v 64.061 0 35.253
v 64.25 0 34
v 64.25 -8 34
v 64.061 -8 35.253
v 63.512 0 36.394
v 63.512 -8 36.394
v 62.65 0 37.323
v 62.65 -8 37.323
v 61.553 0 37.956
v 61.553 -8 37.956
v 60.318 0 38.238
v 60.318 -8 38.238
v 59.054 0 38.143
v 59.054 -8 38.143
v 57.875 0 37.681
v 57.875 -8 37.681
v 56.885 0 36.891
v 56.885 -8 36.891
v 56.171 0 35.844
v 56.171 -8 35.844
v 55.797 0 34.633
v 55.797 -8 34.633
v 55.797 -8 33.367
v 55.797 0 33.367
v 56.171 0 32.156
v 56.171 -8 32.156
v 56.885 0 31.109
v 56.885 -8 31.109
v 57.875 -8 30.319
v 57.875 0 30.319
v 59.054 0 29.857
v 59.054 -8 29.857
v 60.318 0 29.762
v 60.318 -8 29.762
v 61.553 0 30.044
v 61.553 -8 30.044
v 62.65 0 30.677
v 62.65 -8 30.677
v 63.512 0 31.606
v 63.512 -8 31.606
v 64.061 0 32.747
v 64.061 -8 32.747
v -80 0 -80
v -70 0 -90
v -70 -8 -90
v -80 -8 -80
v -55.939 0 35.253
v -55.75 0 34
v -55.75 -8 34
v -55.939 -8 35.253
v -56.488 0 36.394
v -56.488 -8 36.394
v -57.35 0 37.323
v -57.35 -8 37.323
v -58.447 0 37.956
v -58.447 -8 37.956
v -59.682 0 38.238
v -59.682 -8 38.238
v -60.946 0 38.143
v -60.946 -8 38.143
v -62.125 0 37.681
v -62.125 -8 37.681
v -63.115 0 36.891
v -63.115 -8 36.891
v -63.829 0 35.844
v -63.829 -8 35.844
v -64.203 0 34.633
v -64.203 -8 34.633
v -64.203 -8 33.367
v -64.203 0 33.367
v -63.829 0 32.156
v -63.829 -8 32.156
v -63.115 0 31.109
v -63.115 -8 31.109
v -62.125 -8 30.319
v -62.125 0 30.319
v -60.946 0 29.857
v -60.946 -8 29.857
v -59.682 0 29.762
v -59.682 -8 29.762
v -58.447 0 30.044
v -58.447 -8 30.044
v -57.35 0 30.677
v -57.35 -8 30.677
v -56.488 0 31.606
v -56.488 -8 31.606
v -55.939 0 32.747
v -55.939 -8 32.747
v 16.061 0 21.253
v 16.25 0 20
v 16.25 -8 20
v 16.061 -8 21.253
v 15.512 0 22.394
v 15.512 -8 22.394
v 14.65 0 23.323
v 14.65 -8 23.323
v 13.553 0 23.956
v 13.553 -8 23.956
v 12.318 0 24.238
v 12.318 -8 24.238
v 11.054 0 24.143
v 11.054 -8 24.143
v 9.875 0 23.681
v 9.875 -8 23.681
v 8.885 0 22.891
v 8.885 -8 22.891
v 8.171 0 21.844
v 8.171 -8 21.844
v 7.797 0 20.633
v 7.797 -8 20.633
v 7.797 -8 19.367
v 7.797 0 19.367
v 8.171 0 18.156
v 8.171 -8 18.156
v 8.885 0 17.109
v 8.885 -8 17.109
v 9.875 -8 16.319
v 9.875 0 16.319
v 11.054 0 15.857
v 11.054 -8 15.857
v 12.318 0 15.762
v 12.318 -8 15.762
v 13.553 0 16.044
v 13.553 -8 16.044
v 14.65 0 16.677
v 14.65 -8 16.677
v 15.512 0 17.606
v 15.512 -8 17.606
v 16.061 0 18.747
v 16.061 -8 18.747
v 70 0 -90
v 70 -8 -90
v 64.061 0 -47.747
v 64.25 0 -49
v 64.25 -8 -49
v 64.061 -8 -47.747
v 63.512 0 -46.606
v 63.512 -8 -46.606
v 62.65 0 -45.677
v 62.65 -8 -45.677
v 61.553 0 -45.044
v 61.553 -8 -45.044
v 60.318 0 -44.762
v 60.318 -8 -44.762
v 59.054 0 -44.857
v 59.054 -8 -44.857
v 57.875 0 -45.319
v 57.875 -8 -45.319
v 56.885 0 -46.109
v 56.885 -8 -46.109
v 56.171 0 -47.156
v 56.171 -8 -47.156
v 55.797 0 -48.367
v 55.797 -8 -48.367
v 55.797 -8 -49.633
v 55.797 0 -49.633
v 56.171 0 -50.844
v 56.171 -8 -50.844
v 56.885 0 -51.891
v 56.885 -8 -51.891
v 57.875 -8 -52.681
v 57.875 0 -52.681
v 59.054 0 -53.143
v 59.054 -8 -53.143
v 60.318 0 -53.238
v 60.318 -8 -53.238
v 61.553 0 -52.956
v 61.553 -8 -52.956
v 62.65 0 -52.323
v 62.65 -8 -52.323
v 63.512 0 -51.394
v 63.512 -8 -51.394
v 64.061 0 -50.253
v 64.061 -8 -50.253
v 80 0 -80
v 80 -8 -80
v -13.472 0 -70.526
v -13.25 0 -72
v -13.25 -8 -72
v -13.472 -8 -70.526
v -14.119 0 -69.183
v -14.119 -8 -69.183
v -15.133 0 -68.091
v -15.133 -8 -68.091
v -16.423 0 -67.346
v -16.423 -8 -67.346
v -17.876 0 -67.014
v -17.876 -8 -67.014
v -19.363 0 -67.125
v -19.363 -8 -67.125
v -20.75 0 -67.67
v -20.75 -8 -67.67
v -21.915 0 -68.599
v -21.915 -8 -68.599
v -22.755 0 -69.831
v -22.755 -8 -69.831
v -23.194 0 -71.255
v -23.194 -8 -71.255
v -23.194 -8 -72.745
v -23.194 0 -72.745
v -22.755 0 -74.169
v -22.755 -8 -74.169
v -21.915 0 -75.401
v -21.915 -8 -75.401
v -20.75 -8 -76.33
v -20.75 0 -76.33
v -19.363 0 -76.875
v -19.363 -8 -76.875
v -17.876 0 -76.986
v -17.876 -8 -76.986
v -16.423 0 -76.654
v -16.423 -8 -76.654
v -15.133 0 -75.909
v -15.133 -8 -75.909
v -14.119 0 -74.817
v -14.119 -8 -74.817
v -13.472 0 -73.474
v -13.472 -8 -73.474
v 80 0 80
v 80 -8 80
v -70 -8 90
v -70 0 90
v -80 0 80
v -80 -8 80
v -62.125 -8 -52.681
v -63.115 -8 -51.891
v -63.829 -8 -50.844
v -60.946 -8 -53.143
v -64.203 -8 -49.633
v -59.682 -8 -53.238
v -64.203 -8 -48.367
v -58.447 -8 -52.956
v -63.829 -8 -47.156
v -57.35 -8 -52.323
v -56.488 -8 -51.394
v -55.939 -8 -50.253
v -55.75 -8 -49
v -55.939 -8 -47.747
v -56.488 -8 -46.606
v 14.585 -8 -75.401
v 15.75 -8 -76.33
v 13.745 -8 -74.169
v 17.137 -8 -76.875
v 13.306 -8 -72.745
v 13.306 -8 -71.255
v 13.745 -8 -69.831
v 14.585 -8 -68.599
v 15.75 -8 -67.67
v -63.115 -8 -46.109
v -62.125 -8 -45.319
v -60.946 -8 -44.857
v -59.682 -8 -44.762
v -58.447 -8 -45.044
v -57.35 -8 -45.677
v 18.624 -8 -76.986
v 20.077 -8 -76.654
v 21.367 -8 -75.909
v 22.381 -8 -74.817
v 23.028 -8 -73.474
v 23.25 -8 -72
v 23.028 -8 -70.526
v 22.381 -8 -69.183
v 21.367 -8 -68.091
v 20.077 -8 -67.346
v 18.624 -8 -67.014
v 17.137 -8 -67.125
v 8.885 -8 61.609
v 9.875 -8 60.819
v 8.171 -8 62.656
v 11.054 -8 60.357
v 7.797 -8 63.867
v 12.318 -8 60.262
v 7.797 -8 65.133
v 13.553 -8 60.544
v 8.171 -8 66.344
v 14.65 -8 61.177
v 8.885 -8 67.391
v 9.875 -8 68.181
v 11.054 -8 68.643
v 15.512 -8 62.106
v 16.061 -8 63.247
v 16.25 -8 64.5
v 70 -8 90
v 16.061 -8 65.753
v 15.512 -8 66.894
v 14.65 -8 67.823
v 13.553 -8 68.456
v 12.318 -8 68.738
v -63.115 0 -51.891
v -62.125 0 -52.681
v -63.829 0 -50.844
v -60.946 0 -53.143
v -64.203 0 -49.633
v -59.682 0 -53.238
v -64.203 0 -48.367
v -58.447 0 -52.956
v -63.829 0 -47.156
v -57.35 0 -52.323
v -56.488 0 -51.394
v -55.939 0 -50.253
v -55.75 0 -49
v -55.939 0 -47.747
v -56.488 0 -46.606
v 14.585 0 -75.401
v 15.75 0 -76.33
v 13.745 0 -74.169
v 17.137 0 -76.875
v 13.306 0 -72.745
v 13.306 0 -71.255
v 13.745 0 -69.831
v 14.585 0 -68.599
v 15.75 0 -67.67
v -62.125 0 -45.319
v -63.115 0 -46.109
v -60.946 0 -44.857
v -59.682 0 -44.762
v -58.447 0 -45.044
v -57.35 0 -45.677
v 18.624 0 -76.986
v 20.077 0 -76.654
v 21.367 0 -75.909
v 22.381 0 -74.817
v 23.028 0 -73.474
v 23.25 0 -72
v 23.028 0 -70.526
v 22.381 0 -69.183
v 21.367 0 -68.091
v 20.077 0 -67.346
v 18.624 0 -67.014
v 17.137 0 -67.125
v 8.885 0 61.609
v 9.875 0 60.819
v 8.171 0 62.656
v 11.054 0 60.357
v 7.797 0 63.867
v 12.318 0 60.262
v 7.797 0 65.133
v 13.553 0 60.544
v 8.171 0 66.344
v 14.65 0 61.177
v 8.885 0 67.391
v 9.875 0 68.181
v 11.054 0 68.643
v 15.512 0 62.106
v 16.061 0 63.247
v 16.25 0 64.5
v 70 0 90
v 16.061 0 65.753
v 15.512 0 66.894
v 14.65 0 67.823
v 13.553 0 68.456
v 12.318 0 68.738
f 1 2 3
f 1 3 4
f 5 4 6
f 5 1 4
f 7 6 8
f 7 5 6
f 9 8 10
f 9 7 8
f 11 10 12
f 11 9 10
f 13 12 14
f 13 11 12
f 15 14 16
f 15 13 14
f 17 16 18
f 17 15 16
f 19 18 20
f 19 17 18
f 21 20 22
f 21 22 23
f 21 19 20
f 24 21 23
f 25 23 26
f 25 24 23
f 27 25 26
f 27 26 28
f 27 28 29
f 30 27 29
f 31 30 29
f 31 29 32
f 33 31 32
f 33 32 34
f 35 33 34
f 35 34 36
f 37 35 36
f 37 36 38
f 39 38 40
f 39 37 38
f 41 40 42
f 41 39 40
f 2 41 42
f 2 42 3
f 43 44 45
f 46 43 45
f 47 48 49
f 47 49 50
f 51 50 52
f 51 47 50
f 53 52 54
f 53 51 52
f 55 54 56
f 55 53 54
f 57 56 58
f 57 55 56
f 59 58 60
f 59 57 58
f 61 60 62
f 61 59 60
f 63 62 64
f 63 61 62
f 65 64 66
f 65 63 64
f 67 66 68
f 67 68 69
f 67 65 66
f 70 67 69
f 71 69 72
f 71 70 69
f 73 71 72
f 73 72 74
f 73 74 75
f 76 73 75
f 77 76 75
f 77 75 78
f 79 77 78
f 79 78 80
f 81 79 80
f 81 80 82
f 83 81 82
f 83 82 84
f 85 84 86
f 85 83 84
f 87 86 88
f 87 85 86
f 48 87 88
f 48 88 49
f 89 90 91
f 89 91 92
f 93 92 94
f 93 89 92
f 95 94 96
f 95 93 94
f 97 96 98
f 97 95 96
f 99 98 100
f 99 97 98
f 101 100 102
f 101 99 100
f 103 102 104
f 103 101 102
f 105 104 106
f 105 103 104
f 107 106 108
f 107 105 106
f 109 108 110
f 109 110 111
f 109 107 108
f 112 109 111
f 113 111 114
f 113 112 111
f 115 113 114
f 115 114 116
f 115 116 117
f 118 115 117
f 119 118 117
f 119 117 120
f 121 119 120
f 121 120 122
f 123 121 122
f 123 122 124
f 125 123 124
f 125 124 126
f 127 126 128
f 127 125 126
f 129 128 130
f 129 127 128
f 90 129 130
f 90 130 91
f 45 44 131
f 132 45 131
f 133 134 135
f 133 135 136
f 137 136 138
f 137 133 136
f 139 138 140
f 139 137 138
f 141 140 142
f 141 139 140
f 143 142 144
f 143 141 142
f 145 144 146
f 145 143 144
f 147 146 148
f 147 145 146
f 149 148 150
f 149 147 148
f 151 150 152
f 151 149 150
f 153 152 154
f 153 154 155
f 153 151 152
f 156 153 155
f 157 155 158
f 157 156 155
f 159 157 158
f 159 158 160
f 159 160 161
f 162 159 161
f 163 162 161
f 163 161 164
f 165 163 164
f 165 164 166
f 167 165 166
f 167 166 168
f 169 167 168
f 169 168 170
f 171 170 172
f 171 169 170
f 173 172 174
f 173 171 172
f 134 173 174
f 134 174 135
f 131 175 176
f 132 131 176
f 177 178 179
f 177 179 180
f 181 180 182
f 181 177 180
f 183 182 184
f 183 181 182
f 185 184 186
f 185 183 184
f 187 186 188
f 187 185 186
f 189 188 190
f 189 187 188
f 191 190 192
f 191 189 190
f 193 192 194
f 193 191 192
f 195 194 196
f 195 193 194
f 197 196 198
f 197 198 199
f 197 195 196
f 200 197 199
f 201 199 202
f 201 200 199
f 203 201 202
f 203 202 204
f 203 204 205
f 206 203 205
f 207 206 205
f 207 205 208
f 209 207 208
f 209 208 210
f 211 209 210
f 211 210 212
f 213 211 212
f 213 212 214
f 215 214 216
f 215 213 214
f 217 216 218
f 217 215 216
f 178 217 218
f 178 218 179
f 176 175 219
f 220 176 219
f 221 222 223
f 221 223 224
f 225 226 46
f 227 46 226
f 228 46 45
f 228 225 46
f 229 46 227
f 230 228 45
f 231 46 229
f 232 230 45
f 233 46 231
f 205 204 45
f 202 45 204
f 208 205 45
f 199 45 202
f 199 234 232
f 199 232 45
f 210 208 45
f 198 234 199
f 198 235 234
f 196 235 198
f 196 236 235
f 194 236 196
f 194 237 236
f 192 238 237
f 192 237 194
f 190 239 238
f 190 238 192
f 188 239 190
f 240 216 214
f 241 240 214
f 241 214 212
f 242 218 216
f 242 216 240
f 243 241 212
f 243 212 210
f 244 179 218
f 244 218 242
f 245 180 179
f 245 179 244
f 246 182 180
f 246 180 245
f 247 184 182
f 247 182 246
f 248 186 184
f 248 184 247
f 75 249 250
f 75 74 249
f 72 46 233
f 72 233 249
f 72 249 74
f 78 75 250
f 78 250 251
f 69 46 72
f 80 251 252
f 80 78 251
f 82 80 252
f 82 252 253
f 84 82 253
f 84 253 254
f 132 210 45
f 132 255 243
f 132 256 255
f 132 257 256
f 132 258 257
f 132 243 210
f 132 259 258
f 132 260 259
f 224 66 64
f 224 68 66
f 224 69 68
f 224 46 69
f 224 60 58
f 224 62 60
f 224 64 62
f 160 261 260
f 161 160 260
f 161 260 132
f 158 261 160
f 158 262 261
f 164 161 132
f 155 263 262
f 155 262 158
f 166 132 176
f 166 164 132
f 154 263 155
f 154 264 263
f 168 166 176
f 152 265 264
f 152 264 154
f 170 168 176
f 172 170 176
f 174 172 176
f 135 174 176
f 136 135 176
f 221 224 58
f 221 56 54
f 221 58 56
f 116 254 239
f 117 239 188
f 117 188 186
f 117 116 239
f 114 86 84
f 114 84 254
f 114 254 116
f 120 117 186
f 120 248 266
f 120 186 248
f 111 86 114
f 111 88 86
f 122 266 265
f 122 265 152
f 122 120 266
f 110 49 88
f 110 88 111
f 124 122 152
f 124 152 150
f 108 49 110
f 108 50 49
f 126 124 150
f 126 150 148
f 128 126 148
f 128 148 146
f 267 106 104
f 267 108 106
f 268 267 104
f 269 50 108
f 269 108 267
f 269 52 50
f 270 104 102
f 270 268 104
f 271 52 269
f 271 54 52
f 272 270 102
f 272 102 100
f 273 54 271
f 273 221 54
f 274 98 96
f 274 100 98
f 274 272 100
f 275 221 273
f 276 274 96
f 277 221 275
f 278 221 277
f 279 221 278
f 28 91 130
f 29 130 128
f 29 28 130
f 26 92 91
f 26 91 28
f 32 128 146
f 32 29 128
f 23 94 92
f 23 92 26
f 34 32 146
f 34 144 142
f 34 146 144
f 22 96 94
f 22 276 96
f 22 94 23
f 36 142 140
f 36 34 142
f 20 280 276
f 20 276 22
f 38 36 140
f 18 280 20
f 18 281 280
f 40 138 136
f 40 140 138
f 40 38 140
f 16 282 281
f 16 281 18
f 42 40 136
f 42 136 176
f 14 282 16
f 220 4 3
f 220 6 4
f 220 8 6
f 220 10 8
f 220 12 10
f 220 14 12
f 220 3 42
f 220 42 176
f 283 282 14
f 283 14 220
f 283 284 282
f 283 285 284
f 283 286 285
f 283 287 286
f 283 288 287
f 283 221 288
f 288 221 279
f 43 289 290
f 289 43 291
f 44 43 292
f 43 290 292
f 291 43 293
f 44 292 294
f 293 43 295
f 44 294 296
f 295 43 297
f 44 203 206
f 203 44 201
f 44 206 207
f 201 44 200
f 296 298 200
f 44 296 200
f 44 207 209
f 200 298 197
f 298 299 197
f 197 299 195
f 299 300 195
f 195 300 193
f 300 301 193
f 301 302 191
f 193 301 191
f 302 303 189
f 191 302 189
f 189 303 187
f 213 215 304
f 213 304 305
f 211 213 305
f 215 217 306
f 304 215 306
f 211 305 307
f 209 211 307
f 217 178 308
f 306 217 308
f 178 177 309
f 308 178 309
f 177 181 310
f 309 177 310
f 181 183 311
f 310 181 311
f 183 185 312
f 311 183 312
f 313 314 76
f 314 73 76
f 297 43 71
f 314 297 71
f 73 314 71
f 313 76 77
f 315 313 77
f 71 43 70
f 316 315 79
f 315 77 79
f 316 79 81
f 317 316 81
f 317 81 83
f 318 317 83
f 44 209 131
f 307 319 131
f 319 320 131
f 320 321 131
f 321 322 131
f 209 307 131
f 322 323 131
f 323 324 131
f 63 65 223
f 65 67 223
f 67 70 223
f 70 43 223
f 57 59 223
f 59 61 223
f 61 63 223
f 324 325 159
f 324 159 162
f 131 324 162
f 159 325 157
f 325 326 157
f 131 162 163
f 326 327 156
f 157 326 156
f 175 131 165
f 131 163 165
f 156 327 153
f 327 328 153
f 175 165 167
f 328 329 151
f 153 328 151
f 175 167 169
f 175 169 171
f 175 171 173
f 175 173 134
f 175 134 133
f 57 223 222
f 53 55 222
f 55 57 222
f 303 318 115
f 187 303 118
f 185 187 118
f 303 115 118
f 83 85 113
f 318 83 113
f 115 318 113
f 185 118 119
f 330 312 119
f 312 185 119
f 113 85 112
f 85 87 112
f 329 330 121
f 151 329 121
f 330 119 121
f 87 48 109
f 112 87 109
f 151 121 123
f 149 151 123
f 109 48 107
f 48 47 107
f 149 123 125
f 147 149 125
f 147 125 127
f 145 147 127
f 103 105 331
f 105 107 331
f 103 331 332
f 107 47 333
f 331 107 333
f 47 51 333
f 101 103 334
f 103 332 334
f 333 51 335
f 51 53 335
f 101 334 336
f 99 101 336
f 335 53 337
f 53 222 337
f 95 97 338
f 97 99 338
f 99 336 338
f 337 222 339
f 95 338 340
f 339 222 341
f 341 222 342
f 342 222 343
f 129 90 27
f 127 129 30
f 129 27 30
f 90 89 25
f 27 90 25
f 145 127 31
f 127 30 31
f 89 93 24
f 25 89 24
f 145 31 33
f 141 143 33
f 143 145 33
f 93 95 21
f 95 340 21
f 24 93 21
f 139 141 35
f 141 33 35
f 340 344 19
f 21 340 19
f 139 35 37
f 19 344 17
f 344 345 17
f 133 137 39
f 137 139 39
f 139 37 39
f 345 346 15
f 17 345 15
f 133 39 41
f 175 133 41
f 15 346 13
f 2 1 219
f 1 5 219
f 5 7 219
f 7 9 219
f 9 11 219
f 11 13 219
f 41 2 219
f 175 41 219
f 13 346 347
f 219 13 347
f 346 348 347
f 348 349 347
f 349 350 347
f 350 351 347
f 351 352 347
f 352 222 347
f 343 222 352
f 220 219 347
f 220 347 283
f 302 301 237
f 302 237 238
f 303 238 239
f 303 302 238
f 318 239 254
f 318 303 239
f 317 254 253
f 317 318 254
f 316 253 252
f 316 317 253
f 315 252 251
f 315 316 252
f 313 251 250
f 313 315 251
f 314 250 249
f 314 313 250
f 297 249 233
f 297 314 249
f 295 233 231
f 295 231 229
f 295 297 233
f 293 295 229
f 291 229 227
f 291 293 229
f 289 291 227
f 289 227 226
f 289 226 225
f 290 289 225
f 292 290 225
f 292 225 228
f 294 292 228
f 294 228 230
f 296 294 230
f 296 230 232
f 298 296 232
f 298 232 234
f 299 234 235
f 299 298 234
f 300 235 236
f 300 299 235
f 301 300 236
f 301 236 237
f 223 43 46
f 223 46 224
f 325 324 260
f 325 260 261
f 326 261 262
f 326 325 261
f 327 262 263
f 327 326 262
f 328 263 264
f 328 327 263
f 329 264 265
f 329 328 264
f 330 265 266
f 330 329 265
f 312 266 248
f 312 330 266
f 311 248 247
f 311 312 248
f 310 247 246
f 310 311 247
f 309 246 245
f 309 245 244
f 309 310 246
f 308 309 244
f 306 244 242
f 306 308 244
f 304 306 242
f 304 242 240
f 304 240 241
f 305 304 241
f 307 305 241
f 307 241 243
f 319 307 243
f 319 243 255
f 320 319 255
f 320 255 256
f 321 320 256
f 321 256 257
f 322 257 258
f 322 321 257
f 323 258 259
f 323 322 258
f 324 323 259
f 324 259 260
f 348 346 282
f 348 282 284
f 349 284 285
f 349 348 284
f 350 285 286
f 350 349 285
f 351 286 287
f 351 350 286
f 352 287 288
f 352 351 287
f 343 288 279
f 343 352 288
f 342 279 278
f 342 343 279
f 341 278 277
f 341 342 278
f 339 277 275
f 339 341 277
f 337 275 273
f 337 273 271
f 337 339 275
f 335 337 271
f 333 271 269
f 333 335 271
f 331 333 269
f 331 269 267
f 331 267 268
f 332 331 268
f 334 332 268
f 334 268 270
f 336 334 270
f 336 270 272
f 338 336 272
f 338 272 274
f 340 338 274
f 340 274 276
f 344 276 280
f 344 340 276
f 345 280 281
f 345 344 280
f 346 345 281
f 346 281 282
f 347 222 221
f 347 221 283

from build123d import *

# Parameters (mm, degrees)
F0_W     = 160
F0_H     = 180
F0_R     = 4.25
F0_R_2   = 5
F1_DEPTH = 8
F2_SIZE  = 10


with BuildPart() as f1:
    # F0 (on Front) → F1 (new body)
    with BuildSketch(Plane.XZ):
        Rectangle(F0_W, F0_H)
        with Locations((-60, -49)):
            Circle(F0_R, mode=Mode.SUBTRACT)
        with Locations((-18.25, -72)):
            Circle(F0_R_2, mode=Mode.SUBTRACT)
        with Locations((18.25, -72)):
            Circle(F0_R_2, mode=Mode.SUBTRACT)
        with Locations((60, -49)):
            Circle(F0_R, mode=Mode.SUBTRACT)
        with Locations((-60, 34)):
            Circle(F0_R, mode=Mode.SUBTRACT)
        with Locations((12, 20)):
            Circle(F0_R, mode=Mode.SUBTRACT)
        with Locations((60, 34)):
            Circle(F0_R, mode=Mode.SUBTRACT)
        with Locations((12, 64.5)):
            Circle(F0_R, mode=Mode.SUBTRACT)
    extrude(amount=F1_DEPTH)

    # F2
    f2_edges = [f1.edges().sort_by_distance(p)[0] for p in [
        (-80, -4, 90),
        (80, -4, 90),
        (80, -4, -90),
        (-80, -4, -90),
    ]]
    chamfer(f2_edges, length=F2_SIZE)


solid = f1.part
